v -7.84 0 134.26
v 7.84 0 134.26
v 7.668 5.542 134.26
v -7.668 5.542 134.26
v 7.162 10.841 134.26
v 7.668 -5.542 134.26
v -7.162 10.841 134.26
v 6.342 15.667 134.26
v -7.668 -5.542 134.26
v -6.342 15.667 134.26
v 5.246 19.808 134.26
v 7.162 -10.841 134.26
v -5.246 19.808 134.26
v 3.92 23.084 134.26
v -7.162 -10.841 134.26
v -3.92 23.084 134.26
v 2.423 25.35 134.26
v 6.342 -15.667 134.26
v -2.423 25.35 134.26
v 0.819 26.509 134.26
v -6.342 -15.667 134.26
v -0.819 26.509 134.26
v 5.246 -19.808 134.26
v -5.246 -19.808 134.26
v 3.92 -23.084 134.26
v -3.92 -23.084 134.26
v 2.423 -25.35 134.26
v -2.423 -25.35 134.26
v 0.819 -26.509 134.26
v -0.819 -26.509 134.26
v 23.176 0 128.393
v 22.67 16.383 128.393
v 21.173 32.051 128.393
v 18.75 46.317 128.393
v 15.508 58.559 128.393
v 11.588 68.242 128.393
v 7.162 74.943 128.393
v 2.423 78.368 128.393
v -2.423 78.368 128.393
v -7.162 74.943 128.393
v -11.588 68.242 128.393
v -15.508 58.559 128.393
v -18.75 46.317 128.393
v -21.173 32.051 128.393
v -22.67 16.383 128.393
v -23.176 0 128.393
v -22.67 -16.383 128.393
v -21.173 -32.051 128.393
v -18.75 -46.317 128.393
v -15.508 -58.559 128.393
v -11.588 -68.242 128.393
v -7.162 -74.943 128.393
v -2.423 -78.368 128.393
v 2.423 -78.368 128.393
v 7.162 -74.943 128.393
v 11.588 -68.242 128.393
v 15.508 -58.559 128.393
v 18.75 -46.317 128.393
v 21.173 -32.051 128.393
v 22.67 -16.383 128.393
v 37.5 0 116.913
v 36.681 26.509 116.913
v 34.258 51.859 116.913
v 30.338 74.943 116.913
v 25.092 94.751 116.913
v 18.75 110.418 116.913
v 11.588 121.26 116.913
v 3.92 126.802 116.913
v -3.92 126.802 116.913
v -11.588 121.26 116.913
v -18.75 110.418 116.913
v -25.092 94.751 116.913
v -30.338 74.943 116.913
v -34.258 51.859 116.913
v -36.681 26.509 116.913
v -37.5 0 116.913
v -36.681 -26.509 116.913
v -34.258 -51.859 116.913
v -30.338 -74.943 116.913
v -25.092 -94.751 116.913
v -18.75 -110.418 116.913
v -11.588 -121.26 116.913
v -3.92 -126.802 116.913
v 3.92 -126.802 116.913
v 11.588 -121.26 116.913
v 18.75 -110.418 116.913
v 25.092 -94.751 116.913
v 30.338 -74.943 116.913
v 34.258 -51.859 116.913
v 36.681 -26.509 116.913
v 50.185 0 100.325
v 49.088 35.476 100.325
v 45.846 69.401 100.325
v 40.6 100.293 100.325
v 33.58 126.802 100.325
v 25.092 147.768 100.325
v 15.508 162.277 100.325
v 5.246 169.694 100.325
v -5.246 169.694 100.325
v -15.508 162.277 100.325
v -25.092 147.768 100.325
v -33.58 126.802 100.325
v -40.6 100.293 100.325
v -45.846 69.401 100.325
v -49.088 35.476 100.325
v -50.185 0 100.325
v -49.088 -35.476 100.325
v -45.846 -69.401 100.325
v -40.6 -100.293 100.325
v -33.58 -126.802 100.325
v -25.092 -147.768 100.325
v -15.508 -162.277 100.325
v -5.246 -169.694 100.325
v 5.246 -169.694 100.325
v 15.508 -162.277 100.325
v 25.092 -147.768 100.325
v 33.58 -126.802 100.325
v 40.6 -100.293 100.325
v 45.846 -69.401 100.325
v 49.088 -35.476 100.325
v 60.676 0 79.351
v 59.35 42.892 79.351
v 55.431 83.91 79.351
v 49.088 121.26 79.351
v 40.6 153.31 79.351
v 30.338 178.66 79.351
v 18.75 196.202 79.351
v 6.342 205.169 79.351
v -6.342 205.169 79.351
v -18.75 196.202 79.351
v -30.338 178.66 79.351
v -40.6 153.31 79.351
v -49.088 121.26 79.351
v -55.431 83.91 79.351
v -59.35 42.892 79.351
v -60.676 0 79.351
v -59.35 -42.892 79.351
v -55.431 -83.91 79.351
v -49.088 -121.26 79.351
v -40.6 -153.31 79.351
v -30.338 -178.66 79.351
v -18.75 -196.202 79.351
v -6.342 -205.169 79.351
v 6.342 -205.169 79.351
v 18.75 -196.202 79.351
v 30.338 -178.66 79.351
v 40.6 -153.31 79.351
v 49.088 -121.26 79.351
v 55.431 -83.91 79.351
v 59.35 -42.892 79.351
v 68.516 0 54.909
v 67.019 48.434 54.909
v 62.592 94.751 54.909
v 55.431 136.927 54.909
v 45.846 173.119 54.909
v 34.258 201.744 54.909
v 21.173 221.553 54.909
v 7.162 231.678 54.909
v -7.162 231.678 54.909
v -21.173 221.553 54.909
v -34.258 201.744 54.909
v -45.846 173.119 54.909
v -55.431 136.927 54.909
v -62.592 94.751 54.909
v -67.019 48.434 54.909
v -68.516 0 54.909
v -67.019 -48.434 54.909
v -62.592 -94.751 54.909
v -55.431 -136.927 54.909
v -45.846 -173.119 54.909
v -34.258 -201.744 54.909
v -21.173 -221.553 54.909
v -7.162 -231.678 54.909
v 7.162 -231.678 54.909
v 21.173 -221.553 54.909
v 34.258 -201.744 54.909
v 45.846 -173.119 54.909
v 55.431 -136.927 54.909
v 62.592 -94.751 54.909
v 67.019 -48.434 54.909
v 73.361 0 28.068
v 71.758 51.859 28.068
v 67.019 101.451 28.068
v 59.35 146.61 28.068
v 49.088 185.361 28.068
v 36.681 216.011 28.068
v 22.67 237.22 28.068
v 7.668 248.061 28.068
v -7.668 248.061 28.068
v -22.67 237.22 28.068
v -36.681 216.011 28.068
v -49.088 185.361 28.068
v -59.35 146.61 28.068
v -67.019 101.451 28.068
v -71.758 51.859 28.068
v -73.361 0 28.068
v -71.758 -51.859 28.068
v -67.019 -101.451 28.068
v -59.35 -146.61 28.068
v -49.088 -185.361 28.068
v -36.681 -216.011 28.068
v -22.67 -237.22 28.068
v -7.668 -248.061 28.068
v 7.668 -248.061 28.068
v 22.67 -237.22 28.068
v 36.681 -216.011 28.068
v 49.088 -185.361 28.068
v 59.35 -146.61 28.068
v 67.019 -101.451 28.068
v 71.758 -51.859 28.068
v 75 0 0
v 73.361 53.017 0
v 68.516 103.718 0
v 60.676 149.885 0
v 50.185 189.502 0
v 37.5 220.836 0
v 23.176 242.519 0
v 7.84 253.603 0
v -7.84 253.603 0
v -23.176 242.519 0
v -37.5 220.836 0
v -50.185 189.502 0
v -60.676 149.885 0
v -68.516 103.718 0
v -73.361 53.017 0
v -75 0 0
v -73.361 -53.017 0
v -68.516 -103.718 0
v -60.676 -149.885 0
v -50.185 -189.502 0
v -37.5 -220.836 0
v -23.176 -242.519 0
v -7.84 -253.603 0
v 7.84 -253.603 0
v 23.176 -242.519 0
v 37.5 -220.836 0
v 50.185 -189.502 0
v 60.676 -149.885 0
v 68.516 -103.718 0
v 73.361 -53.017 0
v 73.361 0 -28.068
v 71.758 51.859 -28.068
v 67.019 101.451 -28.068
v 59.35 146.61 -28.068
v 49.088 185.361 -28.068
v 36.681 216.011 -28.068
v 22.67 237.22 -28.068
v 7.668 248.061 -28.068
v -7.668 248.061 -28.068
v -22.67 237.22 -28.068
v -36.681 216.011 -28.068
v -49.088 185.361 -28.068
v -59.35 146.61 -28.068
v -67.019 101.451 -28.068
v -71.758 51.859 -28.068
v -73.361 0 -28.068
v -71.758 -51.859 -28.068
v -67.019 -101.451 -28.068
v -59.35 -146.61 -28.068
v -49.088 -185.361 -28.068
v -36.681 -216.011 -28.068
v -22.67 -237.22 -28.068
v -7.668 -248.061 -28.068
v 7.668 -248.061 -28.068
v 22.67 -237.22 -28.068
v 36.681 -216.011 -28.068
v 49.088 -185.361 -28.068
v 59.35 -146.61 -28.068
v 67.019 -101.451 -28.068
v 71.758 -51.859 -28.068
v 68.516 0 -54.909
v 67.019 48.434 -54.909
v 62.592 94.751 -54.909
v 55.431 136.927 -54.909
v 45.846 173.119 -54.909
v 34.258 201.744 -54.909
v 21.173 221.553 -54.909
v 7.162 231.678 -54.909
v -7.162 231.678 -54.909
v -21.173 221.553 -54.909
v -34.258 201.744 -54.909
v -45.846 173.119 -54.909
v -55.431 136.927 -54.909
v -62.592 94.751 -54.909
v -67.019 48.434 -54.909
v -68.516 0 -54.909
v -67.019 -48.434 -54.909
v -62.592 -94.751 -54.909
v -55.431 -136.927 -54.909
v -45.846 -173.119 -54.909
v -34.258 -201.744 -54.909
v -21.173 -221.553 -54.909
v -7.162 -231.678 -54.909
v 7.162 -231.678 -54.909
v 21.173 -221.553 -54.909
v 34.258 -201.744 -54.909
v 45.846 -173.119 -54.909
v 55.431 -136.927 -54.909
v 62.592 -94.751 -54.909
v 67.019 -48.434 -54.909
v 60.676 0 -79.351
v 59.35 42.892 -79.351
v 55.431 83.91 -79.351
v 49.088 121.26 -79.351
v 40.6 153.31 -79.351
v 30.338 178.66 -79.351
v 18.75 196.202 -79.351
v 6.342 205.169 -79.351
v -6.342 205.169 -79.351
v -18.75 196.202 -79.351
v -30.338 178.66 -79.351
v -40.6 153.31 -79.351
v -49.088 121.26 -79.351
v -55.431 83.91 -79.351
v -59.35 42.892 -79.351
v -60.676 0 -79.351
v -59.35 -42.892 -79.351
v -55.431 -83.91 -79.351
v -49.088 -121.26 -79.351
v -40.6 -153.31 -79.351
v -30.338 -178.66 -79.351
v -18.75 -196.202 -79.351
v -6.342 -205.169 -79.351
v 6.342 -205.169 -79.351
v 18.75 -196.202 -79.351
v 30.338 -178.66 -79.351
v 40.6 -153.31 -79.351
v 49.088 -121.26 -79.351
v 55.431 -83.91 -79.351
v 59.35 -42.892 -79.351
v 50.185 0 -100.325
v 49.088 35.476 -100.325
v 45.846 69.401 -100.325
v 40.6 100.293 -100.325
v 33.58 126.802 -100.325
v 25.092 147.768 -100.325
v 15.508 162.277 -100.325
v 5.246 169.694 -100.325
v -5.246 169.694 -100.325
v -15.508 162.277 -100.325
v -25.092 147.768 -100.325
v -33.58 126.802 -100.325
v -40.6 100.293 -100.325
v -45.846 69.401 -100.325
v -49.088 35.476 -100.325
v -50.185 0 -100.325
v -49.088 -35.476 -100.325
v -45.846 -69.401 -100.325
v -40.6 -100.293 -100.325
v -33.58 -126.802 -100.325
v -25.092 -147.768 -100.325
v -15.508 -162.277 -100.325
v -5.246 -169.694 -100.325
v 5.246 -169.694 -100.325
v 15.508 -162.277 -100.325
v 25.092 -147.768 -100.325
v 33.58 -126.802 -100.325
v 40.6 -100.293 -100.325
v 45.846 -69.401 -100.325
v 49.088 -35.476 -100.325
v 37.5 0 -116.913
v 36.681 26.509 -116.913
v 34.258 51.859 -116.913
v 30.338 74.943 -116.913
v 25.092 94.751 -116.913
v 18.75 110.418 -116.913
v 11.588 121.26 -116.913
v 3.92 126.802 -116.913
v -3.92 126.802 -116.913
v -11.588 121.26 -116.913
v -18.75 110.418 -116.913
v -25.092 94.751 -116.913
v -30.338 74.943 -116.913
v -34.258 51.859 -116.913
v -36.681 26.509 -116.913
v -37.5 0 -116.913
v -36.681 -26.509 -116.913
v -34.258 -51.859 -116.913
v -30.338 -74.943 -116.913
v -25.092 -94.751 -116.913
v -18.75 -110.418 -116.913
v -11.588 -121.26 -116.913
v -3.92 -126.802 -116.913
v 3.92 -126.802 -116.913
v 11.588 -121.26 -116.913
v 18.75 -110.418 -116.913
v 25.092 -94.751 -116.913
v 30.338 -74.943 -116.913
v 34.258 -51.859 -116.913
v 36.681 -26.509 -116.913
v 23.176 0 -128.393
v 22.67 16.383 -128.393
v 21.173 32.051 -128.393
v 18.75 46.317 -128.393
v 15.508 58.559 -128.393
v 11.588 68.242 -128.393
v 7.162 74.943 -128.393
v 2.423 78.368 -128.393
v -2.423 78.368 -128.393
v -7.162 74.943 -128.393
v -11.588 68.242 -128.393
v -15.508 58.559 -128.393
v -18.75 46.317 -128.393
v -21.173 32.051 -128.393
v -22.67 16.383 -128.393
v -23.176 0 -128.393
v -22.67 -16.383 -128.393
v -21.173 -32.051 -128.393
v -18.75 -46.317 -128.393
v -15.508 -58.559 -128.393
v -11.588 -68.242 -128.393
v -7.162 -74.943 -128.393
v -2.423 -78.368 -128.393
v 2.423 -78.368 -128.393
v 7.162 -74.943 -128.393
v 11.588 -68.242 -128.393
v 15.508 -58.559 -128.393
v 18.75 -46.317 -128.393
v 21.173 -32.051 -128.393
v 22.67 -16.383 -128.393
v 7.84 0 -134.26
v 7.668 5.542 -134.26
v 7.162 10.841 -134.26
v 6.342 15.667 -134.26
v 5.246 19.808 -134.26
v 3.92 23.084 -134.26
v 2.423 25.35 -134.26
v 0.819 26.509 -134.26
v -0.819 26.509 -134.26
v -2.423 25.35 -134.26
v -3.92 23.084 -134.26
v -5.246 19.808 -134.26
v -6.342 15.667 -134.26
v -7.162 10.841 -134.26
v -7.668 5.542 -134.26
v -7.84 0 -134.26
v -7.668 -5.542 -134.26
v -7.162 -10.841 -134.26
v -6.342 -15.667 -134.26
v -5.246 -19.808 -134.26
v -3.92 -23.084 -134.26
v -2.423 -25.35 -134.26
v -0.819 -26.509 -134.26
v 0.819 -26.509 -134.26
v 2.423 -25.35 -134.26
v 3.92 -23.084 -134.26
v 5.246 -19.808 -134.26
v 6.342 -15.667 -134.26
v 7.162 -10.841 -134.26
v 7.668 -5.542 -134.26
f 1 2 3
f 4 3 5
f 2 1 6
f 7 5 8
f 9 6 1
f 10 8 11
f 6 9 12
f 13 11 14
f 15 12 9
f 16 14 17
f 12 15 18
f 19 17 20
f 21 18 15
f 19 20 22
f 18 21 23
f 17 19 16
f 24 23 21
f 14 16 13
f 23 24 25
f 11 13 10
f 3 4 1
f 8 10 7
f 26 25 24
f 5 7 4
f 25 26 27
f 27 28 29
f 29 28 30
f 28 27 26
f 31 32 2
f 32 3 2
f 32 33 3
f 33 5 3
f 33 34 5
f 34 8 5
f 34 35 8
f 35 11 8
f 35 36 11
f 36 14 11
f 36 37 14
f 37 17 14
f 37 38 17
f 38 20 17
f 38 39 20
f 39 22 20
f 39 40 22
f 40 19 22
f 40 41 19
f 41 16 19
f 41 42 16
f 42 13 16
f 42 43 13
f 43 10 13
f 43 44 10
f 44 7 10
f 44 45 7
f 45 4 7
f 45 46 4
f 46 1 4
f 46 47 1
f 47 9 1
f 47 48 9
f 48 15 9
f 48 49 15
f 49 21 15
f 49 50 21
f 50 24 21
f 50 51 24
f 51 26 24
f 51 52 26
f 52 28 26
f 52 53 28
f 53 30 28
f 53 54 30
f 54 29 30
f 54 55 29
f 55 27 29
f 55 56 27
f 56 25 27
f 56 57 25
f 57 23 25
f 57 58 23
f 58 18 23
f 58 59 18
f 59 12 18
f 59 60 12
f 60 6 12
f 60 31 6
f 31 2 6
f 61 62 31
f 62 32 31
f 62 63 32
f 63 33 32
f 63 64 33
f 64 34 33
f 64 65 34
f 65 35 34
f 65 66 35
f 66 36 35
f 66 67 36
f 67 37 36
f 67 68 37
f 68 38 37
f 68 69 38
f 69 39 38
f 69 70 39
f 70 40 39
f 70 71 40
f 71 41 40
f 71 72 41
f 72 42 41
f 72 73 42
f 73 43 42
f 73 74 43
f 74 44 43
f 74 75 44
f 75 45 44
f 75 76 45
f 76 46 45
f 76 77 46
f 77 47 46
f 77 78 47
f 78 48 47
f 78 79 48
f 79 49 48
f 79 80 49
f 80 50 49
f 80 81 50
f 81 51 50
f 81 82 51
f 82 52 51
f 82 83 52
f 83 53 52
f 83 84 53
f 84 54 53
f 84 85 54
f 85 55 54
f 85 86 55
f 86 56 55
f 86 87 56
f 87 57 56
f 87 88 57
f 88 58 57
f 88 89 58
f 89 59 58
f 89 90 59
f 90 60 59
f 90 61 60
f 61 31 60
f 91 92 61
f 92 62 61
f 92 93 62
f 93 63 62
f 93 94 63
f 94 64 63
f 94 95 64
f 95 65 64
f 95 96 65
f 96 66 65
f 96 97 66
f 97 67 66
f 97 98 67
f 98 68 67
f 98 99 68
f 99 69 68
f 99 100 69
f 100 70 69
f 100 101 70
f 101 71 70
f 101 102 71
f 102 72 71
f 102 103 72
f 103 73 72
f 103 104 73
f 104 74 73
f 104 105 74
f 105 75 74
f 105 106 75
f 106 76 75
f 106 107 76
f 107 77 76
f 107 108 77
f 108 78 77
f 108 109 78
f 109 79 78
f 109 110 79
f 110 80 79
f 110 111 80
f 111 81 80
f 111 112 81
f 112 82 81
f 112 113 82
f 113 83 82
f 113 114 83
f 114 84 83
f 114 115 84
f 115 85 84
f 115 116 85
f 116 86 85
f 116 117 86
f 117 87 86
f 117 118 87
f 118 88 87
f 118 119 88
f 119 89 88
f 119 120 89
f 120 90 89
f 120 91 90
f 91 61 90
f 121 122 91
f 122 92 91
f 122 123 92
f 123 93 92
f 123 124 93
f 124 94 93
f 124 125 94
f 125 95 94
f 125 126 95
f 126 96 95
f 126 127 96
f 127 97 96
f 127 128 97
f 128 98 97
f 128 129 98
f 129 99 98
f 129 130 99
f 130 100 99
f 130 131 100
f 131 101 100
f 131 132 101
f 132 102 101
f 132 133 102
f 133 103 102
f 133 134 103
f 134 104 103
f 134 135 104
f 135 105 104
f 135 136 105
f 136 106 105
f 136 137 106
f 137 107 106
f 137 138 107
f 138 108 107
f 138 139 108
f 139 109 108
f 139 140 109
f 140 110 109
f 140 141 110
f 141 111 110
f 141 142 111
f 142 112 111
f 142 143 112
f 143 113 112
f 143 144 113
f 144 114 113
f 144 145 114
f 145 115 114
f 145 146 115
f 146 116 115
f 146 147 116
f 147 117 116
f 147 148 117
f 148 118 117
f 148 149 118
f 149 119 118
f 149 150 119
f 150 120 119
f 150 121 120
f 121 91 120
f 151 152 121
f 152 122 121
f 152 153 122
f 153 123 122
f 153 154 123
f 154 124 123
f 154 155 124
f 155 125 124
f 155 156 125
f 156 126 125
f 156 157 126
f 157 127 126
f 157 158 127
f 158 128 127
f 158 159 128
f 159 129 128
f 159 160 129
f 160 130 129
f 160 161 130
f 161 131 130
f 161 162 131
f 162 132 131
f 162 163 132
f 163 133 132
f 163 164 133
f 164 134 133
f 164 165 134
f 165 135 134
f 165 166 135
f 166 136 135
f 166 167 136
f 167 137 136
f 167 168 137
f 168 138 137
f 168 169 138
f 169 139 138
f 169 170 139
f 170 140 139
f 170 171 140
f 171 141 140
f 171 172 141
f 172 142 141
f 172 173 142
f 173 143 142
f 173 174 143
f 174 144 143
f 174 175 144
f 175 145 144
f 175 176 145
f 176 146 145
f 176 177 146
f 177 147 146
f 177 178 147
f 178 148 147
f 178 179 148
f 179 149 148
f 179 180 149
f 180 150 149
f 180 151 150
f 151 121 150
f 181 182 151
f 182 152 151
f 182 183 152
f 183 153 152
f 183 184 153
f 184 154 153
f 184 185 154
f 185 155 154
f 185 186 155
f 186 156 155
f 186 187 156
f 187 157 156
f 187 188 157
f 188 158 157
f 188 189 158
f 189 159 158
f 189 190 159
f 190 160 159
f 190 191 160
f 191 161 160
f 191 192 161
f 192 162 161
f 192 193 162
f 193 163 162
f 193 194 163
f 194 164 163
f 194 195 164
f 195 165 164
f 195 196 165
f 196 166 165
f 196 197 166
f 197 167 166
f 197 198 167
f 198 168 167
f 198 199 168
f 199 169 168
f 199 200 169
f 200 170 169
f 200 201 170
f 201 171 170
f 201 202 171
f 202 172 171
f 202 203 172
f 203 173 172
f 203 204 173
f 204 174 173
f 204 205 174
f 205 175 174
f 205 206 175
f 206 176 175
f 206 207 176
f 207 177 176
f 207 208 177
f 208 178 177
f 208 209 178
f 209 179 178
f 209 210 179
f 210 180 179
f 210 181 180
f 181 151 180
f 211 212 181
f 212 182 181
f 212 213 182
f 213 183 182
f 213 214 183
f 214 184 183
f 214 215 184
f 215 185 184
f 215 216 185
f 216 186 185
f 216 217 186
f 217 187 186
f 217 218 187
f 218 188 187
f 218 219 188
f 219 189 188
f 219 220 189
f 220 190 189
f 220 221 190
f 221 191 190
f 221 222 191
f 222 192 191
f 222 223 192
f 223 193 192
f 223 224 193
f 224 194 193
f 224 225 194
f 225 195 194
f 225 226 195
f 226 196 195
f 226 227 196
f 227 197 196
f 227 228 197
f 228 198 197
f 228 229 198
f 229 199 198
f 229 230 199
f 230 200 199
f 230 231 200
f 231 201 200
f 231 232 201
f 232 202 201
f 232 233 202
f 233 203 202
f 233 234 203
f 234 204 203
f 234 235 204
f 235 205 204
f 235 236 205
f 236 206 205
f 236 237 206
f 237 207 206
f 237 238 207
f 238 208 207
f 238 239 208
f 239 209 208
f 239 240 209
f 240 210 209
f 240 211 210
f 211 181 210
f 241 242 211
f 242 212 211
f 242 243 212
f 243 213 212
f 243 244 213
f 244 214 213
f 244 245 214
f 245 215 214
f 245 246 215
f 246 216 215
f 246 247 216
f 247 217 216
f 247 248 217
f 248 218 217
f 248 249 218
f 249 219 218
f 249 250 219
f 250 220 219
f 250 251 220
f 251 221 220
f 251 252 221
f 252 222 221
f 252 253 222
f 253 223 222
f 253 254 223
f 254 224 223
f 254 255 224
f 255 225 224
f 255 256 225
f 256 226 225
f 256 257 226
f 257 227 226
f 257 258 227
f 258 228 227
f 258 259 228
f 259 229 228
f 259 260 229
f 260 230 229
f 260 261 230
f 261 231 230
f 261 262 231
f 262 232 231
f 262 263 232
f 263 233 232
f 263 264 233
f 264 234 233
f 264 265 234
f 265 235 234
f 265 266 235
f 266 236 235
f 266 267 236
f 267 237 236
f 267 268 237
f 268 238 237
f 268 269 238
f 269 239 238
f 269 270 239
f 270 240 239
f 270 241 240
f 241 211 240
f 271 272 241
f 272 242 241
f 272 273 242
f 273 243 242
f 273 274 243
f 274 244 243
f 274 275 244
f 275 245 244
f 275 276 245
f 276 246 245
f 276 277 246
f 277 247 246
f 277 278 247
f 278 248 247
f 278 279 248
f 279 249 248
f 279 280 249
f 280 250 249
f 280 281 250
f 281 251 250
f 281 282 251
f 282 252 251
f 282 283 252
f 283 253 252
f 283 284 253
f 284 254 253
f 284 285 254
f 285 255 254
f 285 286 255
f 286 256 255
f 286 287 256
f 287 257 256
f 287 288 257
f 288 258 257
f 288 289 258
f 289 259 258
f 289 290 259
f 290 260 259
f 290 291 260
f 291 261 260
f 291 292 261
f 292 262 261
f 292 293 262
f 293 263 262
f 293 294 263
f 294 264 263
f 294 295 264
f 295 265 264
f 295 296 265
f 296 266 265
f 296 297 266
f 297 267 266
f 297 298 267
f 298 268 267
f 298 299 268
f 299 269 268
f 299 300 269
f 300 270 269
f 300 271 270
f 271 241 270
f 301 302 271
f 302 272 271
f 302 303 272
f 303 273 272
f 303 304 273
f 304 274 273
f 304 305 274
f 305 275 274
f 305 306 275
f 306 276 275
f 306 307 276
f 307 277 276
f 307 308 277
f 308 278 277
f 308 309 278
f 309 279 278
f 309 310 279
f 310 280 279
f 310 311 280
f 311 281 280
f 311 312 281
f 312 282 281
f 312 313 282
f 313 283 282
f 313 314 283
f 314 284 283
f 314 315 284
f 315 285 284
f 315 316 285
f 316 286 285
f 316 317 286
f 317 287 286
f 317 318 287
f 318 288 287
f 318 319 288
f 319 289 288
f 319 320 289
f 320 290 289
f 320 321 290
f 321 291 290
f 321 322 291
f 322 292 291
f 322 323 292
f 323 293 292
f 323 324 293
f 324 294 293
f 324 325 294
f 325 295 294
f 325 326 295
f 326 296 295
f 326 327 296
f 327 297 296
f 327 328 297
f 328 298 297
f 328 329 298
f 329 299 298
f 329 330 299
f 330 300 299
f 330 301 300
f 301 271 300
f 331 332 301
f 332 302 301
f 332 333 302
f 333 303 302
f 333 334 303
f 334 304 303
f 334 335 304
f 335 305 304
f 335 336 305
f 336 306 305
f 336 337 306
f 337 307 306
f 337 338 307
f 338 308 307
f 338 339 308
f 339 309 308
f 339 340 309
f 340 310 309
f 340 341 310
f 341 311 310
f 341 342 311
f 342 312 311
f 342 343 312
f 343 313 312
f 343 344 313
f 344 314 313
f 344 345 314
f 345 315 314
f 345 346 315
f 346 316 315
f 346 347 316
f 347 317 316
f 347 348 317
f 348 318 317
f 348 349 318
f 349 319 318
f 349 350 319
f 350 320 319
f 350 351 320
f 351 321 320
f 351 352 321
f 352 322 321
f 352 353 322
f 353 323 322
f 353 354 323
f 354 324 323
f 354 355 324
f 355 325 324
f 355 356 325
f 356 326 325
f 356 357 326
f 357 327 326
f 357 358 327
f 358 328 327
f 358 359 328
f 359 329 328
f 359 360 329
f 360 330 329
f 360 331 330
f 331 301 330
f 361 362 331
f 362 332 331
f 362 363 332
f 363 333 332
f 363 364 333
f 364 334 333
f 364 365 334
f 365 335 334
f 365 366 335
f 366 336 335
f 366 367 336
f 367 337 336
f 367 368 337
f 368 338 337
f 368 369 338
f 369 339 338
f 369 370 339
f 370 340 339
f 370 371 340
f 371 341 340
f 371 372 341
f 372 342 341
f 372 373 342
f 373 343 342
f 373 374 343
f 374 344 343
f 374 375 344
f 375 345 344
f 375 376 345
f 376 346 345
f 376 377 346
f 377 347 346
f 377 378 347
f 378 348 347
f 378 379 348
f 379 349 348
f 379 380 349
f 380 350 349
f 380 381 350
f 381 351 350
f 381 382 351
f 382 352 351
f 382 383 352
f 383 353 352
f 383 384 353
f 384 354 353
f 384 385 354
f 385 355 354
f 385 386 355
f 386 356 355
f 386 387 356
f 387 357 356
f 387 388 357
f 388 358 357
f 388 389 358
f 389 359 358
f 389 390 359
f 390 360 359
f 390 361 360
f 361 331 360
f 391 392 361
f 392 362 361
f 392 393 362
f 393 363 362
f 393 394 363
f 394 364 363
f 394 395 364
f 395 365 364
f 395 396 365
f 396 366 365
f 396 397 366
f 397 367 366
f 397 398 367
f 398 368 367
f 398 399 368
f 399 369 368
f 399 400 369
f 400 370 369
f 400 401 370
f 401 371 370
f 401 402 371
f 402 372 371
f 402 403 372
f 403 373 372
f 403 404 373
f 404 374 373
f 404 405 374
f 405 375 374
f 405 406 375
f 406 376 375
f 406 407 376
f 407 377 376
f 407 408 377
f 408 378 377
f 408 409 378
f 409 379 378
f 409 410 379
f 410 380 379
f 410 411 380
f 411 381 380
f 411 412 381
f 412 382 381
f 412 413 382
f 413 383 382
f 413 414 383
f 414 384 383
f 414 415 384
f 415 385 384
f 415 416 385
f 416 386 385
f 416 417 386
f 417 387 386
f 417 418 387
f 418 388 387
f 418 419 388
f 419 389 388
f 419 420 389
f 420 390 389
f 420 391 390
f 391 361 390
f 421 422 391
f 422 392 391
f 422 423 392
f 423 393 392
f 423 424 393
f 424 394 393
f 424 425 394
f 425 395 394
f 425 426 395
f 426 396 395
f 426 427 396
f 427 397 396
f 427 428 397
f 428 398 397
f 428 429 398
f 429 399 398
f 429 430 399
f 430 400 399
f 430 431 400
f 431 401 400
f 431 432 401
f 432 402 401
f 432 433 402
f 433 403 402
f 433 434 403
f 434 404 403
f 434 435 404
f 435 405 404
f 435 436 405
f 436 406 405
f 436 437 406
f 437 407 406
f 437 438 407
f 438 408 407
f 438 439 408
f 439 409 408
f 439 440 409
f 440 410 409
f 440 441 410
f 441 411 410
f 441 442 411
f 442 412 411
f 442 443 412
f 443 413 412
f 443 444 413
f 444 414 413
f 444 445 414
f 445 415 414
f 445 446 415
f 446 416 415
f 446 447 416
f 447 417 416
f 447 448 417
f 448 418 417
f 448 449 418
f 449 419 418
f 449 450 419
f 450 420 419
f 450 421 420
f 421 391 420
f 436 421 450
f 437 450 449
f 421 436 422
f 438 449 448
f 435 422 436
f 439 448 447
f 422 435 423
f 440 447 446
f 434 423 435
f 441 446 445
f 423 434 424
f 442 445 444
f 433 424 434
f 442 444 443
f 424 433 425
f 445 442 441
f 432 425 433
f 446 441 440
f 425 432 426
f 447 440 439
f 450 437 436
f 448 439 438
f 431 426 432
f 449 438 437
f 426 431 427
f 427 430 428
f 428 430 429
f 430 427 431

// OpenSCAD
// Generated by SolidPython 1.0.1 on 2020-07-29 00:46:46


scale(v = [5, 17, 9]) {
	sphere(r = 15);
}
/***********************************************
*********      SolidPython code:      **********
************************************************
 
# import packages: SolidPython
from solid import *
from solid.utils import *
from itertools import chain, combinations, permutations


class Resize:

    def __init__(self, scad_file):
        self.scad_file = scad_file
        #self.scad_file = import_scad(scad_file)
        # cone/cylinder param:
        self.r1 = 0
        self.r2 = 0
        self.h = 0
        # rectangular prism param:
        self.w = 0
        self.l = 0
        # ellipse param:
        self.r = 0

    # import OpenScad code (file name corresponds to shape)


    # classify shape + parameters
    def assign(self, param1, param2, param3):
        if self.scad_file == 'cone.scad':
            self.r1 = param1
            self.r2 = param2
            self.h = param3
        elif self.scad_file == 'cylinder.scad':
            self.r1 = param1
            self.r2 = param2
            self.h = param3
        elif self.scad_file == 'rectangularPrism.scad':
            self.h = param1
            self.l = param2
            self.w = param3
        else:
            self.r = param1
            self.h = param2

    # resize parameters
    def iterate(self):
        x = range(3, 20, 2)
        i = 1
        if self.scad_file == 'cone.scad':
            tempList = list(permutations(x, 2))
            for temp in tempList:
                param1 = temp[0]
                param2 = temp[1]
                filepath = 'produced_scad_files/' + 'cone' + str(param1) + '_' + str(param2) + '_' + '.scad'
                scad_render_to_file(cylinder(h=param1, r1=param2, r2=0), filepath)

        elif self.scad_file == 'cylinder.scad':
            tempList = list(permutations(x, 3))
            for temp in tempList:
                param1 = temp[0]
                param2 = temp[1]
                filepath = 'produced_scad_files/' + 'cylinder' + str(param1) + '_' + str(param2) + '_' + '.scad'
                scad_render_to_file(cylinder(h=param1, r1=param2, r2=param2), filepath)

        elif self.scad_file == 'rectangularPrism.scad':
            tempList = list(permutations(x, 3))
            for temp in tempList:
                param1 = temp[0]
                param2 = temp[1]
                param3 = temp[2]
                filepath = 'produced_scad_files/' + 'rectangularPrism' + str(param1) + '_' + str(param2) + '_' + str(
                    param3) + '.scad'
                scad_render_to_file(cube(size=(param1, param2, param3)), filepath)

        elif self.scad_file == 'ellipse.scad':
            tempList = list(permutations(x, 4))
            for temp in tempList:
                param1 = temp[0]
                param2 = temp[1]
                param3 = temp[2]
                param4 = temp[3]
                filepath = 'produced_scad_files/' + 'ellipse' + str(param1) + '_' + str(param2) + '_' + str(param3) + '_' + str(param4) + '.scad'
                scad_render_to_file(scale([param1, param2, param3])(sphere(r=param4)), filepath)

    def render_to_scadfile(self):
        scad_render_to_file(scad, 'example.scad') 
 
************************************************/
